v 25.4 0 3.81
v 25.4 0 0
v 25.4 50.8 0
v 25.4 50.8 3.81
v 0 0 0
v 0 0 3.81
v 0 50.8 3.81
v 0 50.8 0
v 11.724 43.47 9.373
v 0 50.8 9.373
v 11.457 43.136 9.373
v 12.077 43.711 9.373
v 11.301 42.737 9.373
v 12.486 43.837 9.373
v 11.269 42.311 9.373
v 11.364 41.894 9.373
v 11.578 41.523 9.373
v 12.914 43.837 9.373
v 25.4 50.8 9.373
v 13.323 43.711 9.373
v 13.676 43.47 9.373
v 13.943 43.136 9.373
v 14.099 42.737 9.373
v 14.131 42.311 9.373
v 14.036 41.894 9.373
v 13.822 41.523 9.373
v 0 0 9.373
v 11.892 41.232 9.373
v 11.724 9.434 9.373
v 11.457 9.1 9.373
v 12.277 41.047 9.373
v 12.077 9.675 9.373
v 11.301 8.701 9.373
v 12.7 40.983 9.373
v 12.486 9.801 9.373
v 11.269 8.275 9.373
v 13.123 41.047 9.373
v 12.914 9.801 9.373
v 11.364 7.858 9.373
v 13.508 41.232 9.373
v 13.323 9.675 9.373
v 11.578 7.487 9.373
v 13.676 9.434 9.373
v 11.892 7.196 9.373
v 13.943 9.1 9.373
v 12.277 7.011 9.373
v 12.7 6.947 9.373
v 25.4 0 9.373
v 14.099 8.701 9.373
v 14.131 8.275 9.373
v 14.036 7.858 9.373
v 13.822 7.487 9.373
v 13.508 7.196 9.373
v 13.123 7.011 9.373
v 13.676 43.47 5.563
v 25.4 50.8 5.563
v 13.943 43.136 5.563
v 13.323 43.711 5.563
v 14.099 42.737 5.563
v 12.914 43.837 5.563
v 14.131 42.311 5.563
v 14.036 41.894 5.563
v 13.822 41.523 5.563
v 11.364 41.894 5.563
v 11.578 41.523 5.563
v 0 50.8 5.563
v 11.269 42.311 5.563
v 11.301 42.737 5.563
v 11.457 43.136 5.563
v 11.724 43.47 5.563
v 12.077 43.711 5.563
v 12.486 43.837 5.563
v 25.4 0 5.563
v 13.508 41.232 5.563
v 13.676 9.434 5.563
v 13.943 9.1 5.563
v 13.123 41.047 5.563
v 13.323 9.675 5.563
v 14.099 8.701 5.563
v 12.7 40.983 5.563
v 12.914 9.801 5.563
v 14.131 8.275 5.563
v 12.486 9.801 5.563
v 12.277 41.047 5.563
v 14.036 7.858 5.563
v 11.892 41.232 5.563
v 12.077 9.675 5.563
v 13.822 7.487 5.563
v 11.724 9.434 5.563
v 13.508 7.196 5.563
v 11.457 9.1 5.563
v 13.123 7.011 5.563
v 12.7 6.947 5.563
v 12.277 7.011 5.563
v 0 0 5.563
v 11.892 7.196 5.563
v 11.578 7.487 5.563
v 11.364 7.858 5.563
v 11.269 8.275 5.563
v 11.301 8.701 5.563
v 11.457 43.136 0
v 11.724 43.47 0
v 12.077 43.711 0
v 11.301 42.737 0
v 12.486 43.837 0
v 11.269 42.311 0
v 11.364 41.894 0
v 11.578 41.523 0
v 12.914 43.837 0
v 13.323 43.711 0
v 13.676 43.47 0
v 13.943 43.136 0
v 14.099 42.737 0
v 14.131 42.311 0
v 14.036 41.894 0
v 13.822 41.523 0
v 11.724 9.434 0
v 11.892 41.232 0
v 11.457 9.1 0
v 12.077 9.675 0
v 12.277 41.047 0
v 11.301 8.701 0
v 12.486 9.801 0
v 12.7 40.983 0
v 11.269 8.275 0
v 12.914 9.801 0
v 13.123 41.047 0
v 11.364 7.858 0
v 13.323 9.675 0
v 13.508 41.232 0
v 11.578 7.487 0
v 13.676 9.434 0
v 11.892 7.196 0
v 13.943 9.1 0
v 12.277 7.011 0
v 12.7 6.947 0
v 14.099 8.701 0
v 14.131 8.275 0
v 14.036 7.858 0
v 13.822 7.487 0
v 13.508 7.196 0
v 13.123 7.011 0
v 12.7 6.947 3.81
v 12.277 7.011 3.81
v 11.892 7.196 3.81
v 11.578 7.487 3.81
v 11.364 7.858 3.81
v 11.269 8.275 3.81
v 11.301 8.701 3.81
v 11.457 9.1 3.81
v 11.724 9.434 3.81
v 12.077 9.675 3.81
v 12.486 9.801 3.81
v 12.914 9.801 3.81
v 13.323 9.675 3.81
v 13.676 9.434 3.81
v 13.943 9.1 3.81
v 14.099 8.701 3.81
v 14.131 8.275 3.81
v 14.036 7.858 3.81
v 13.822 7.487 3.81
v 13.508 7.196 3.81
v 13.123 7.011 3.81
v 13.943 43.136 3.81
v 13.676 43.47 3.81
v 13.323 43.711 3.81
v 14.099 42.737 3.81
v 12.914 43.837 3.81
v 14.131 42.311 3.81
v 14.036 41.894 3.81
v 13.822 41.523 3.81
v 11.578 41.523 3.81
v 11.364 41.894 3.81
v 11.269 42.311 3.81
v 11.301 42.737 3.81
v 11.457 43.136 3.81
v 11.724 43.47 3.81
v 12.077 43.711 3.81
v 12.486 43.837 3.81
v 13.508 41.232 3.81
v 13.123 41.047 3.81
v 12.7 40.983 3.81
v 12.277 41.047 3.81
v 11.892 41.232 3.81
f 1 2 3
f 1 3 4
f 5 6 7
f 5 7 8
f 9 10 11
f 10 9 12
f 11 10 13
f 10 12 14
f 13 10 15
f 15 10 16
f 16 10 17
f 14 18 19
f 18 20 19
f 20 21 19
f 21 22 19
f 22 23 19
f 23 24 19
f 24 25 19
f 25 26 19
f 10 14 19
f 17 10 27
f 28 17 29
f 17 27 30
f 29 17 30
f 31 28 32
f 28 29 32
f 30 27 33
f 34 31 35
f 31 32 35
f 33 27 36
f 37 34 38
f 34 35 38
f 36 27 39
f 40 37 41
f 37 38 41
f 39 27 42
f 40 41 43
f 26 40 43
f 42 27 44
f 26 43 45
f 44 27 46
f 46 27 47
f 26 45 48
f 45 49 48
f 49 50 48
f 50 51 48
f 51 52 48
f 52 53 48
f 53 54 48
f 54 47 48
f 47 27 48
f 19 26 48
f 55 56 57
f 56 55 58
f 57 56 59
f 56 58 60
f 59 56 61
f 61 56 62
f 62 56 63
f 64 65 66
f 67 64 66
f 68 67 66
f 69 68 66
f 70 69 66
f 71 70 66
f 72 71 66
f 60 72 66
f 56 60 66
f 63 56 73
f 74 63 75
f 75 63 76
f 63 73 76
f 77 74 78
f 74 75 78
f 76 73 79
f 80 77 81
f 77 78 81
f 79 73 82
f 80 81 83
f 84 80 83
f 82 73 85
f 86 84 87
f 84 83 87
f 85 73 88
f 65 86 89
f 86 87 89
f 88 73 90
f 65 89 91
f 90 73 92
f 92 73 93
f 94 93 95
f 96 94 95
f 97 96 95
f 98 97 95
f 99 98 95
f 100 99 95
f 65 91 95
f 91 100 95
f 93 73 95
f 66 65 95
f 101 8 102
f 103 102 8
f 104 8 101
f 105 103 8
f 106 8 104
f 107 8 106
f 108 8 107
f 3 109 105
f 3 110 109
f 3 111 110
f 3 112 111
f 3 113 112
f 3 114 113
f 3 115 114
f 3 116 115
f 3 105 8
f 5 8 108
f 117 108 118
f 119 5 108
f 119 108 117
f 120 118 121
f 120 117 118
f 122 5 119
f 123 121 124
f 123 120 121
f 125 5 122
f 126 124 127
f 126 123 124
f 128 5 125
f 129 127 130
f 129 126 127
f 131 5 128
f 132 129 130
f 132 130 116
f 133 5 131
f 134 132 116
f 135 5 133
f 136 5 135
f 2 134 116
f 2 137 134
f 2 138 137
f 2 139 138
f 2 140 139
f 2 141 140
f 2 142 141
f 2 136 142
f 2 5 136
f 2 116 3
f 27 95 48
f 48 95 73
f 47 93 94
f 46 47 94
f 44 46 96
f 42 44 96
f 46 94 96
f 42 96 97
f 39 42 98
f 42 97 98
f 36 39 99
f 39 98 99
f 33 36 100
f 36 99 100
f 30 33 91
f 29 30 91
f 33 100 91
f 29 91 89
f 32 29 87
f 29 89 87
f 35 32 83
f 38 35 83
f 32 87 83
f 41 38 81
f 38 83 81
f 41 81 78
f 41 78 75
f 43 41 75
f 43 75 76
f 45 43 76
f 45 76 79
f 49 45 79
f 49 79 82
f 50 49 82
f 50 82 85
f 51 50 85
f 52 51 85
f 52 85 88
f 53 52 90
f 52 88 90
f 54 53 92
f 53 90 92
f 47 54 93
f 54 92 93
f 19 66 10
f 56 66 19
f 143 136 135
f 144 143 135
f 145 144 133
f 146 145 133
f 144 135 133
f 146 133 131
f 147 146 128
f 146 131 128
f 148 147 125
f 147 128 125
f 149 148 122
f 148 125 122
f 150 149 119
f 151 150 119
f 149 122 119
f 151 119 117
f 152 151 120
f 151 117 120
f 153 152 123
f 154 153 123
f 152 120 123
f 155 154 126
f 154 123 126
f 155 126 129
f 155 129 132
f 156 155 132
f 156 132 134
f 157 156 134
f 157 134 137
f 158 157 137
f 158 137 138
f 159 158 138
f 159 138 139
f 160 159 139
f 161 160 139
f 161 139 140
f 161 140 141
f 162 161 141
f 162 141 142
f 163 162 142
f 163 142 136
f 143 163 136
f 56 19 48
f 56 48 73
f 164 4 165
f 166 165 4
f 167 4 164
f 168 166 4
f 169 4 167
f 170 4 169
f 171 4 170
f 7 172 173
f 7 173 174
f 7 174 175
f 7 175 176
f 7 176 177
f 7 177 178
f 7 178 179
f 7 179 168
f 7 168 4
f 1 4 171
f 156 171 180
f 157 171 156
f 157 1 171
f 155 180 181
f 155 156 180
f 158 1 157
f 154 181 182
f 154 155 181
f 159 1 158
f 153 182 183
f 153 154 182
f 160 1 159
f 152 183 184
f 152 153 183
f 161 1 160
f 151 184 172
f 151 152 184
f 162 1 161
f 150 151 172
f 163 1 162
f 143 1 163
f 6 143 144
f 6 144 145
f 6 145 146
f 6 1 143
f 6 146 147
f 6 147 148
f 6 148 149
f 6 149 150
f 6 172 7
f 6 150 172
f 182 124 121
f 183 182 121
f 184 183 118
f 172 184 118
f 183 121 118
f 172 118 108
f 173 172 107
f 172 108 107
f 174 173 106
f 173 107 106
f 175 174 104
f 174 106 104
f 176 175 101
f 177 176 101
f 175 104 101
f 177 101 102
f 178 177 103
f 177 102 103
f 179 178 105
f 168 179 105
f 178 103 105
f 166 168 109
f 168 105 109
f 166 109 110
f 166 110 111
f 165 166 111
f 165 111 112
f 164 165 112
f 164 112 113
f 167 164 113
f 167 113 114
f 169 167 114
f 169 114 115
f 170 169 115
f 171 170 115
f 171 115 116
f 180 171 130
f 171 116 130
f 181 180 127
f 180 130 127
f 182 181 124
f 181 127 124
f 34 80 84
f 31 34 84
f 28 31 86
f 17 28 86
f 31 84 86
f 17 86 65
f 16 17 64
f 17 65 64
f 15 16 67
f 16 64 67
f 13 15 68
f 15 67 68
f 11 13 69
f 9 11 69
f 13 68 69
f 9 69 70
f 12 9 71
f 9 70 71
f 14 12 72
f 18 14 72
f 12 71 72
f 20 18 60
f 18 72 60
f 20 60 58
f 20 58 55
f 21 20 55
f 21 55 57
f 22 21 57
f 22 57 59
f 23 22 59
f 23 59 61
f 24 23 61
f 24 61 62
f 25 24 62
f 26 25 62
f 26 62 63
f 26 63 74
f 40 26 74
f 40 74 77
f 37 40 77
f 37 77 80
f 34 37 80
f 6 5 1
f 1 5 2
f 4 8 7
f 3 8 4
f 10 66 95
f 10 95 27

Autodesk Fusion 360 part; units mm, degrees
sketch "Sketch1" plane through (0, 0, 0) normal (0, 1, 0) x (1, 0, 0)
  line L0 (0, 0) -> (25.4, 0)
  line L1 (25.4, 0) -> (25.4, -3.81)
  line L2 (25.4, -3.81) -> (0, -3.81)
  line L3 (0, -3.81) -> (0, 0)
  line L4 (0, -3.81) -> (25.4, -3.81) construction
  line L5 (25.4, -3.81) -> (25.4, -5.5626) construction
  line L6 (25.4, -5.5626) -> (0, -5.5626) construction
  line L7 (0, -5.5626) -> (0, -3.81) construction
  line L8 (25.4, -5.5626) -> (0, -5.5626)
  line L9 (0, -5.5626) -> (0, -9.3726)
  line L10 (0, -9.3726) -> (25.4, -9.3726)
  line L11 (25.4, -9.3726) -> (25.4, -5.5626)
  dimension "d1" = 25.4
  dimension "d2" = 3.81
  dimension "d3" = 25.4
  dimension "d4" = 1.7526
  dimension "d5" = 3.81
extrude "Extrude1" add sketch "Sketch1" along normal blind 50.8 makes body 1 at (8.4667, 33.8667, 9.3726) makes body 2 at (16.9333, 33.8667, 3.81)
sketch "Sketch2" plane through (0, 0, 9.3726) normal (0, 0, 1) x (-1, 0, 0)
  line L0 (0, 0) -> (-25.4, 0)
  line L1 (-25.4, 0) -> (-25.4, -50.8)
  line L2 (-25.4, -50.8) -> (0, -50.8)
  line L3 (0, -50.8) -> (0, 0)
  line L4 (-25.4, -50.8) -> (0, -50.8) construction
  line L5 (0, -50.8) -> (0, 0) construction
  line L6 (0, 0) -> (-25.4, 0) construction
  line L7 (-25.4, 0) -> (-25.4, -50.8) construction
  line L8 (-12.7, -50.8) -> (-12.7, 0)
  point P0 (-12.7, -25.4)
  point P1 (-12.7, -42.418)
  point P2 (-12.7, -8.382)
  dimension "d13" = 8.382
  dimension "d14" = 8.382
hole "Hole1" at (12.7, 42.418, 9.3726) at (12.7, 8.382, 9.3726) direction (0, 0, -1) diameter 2.8702 depth 10.16 tip angle 180 bodies 1 2
